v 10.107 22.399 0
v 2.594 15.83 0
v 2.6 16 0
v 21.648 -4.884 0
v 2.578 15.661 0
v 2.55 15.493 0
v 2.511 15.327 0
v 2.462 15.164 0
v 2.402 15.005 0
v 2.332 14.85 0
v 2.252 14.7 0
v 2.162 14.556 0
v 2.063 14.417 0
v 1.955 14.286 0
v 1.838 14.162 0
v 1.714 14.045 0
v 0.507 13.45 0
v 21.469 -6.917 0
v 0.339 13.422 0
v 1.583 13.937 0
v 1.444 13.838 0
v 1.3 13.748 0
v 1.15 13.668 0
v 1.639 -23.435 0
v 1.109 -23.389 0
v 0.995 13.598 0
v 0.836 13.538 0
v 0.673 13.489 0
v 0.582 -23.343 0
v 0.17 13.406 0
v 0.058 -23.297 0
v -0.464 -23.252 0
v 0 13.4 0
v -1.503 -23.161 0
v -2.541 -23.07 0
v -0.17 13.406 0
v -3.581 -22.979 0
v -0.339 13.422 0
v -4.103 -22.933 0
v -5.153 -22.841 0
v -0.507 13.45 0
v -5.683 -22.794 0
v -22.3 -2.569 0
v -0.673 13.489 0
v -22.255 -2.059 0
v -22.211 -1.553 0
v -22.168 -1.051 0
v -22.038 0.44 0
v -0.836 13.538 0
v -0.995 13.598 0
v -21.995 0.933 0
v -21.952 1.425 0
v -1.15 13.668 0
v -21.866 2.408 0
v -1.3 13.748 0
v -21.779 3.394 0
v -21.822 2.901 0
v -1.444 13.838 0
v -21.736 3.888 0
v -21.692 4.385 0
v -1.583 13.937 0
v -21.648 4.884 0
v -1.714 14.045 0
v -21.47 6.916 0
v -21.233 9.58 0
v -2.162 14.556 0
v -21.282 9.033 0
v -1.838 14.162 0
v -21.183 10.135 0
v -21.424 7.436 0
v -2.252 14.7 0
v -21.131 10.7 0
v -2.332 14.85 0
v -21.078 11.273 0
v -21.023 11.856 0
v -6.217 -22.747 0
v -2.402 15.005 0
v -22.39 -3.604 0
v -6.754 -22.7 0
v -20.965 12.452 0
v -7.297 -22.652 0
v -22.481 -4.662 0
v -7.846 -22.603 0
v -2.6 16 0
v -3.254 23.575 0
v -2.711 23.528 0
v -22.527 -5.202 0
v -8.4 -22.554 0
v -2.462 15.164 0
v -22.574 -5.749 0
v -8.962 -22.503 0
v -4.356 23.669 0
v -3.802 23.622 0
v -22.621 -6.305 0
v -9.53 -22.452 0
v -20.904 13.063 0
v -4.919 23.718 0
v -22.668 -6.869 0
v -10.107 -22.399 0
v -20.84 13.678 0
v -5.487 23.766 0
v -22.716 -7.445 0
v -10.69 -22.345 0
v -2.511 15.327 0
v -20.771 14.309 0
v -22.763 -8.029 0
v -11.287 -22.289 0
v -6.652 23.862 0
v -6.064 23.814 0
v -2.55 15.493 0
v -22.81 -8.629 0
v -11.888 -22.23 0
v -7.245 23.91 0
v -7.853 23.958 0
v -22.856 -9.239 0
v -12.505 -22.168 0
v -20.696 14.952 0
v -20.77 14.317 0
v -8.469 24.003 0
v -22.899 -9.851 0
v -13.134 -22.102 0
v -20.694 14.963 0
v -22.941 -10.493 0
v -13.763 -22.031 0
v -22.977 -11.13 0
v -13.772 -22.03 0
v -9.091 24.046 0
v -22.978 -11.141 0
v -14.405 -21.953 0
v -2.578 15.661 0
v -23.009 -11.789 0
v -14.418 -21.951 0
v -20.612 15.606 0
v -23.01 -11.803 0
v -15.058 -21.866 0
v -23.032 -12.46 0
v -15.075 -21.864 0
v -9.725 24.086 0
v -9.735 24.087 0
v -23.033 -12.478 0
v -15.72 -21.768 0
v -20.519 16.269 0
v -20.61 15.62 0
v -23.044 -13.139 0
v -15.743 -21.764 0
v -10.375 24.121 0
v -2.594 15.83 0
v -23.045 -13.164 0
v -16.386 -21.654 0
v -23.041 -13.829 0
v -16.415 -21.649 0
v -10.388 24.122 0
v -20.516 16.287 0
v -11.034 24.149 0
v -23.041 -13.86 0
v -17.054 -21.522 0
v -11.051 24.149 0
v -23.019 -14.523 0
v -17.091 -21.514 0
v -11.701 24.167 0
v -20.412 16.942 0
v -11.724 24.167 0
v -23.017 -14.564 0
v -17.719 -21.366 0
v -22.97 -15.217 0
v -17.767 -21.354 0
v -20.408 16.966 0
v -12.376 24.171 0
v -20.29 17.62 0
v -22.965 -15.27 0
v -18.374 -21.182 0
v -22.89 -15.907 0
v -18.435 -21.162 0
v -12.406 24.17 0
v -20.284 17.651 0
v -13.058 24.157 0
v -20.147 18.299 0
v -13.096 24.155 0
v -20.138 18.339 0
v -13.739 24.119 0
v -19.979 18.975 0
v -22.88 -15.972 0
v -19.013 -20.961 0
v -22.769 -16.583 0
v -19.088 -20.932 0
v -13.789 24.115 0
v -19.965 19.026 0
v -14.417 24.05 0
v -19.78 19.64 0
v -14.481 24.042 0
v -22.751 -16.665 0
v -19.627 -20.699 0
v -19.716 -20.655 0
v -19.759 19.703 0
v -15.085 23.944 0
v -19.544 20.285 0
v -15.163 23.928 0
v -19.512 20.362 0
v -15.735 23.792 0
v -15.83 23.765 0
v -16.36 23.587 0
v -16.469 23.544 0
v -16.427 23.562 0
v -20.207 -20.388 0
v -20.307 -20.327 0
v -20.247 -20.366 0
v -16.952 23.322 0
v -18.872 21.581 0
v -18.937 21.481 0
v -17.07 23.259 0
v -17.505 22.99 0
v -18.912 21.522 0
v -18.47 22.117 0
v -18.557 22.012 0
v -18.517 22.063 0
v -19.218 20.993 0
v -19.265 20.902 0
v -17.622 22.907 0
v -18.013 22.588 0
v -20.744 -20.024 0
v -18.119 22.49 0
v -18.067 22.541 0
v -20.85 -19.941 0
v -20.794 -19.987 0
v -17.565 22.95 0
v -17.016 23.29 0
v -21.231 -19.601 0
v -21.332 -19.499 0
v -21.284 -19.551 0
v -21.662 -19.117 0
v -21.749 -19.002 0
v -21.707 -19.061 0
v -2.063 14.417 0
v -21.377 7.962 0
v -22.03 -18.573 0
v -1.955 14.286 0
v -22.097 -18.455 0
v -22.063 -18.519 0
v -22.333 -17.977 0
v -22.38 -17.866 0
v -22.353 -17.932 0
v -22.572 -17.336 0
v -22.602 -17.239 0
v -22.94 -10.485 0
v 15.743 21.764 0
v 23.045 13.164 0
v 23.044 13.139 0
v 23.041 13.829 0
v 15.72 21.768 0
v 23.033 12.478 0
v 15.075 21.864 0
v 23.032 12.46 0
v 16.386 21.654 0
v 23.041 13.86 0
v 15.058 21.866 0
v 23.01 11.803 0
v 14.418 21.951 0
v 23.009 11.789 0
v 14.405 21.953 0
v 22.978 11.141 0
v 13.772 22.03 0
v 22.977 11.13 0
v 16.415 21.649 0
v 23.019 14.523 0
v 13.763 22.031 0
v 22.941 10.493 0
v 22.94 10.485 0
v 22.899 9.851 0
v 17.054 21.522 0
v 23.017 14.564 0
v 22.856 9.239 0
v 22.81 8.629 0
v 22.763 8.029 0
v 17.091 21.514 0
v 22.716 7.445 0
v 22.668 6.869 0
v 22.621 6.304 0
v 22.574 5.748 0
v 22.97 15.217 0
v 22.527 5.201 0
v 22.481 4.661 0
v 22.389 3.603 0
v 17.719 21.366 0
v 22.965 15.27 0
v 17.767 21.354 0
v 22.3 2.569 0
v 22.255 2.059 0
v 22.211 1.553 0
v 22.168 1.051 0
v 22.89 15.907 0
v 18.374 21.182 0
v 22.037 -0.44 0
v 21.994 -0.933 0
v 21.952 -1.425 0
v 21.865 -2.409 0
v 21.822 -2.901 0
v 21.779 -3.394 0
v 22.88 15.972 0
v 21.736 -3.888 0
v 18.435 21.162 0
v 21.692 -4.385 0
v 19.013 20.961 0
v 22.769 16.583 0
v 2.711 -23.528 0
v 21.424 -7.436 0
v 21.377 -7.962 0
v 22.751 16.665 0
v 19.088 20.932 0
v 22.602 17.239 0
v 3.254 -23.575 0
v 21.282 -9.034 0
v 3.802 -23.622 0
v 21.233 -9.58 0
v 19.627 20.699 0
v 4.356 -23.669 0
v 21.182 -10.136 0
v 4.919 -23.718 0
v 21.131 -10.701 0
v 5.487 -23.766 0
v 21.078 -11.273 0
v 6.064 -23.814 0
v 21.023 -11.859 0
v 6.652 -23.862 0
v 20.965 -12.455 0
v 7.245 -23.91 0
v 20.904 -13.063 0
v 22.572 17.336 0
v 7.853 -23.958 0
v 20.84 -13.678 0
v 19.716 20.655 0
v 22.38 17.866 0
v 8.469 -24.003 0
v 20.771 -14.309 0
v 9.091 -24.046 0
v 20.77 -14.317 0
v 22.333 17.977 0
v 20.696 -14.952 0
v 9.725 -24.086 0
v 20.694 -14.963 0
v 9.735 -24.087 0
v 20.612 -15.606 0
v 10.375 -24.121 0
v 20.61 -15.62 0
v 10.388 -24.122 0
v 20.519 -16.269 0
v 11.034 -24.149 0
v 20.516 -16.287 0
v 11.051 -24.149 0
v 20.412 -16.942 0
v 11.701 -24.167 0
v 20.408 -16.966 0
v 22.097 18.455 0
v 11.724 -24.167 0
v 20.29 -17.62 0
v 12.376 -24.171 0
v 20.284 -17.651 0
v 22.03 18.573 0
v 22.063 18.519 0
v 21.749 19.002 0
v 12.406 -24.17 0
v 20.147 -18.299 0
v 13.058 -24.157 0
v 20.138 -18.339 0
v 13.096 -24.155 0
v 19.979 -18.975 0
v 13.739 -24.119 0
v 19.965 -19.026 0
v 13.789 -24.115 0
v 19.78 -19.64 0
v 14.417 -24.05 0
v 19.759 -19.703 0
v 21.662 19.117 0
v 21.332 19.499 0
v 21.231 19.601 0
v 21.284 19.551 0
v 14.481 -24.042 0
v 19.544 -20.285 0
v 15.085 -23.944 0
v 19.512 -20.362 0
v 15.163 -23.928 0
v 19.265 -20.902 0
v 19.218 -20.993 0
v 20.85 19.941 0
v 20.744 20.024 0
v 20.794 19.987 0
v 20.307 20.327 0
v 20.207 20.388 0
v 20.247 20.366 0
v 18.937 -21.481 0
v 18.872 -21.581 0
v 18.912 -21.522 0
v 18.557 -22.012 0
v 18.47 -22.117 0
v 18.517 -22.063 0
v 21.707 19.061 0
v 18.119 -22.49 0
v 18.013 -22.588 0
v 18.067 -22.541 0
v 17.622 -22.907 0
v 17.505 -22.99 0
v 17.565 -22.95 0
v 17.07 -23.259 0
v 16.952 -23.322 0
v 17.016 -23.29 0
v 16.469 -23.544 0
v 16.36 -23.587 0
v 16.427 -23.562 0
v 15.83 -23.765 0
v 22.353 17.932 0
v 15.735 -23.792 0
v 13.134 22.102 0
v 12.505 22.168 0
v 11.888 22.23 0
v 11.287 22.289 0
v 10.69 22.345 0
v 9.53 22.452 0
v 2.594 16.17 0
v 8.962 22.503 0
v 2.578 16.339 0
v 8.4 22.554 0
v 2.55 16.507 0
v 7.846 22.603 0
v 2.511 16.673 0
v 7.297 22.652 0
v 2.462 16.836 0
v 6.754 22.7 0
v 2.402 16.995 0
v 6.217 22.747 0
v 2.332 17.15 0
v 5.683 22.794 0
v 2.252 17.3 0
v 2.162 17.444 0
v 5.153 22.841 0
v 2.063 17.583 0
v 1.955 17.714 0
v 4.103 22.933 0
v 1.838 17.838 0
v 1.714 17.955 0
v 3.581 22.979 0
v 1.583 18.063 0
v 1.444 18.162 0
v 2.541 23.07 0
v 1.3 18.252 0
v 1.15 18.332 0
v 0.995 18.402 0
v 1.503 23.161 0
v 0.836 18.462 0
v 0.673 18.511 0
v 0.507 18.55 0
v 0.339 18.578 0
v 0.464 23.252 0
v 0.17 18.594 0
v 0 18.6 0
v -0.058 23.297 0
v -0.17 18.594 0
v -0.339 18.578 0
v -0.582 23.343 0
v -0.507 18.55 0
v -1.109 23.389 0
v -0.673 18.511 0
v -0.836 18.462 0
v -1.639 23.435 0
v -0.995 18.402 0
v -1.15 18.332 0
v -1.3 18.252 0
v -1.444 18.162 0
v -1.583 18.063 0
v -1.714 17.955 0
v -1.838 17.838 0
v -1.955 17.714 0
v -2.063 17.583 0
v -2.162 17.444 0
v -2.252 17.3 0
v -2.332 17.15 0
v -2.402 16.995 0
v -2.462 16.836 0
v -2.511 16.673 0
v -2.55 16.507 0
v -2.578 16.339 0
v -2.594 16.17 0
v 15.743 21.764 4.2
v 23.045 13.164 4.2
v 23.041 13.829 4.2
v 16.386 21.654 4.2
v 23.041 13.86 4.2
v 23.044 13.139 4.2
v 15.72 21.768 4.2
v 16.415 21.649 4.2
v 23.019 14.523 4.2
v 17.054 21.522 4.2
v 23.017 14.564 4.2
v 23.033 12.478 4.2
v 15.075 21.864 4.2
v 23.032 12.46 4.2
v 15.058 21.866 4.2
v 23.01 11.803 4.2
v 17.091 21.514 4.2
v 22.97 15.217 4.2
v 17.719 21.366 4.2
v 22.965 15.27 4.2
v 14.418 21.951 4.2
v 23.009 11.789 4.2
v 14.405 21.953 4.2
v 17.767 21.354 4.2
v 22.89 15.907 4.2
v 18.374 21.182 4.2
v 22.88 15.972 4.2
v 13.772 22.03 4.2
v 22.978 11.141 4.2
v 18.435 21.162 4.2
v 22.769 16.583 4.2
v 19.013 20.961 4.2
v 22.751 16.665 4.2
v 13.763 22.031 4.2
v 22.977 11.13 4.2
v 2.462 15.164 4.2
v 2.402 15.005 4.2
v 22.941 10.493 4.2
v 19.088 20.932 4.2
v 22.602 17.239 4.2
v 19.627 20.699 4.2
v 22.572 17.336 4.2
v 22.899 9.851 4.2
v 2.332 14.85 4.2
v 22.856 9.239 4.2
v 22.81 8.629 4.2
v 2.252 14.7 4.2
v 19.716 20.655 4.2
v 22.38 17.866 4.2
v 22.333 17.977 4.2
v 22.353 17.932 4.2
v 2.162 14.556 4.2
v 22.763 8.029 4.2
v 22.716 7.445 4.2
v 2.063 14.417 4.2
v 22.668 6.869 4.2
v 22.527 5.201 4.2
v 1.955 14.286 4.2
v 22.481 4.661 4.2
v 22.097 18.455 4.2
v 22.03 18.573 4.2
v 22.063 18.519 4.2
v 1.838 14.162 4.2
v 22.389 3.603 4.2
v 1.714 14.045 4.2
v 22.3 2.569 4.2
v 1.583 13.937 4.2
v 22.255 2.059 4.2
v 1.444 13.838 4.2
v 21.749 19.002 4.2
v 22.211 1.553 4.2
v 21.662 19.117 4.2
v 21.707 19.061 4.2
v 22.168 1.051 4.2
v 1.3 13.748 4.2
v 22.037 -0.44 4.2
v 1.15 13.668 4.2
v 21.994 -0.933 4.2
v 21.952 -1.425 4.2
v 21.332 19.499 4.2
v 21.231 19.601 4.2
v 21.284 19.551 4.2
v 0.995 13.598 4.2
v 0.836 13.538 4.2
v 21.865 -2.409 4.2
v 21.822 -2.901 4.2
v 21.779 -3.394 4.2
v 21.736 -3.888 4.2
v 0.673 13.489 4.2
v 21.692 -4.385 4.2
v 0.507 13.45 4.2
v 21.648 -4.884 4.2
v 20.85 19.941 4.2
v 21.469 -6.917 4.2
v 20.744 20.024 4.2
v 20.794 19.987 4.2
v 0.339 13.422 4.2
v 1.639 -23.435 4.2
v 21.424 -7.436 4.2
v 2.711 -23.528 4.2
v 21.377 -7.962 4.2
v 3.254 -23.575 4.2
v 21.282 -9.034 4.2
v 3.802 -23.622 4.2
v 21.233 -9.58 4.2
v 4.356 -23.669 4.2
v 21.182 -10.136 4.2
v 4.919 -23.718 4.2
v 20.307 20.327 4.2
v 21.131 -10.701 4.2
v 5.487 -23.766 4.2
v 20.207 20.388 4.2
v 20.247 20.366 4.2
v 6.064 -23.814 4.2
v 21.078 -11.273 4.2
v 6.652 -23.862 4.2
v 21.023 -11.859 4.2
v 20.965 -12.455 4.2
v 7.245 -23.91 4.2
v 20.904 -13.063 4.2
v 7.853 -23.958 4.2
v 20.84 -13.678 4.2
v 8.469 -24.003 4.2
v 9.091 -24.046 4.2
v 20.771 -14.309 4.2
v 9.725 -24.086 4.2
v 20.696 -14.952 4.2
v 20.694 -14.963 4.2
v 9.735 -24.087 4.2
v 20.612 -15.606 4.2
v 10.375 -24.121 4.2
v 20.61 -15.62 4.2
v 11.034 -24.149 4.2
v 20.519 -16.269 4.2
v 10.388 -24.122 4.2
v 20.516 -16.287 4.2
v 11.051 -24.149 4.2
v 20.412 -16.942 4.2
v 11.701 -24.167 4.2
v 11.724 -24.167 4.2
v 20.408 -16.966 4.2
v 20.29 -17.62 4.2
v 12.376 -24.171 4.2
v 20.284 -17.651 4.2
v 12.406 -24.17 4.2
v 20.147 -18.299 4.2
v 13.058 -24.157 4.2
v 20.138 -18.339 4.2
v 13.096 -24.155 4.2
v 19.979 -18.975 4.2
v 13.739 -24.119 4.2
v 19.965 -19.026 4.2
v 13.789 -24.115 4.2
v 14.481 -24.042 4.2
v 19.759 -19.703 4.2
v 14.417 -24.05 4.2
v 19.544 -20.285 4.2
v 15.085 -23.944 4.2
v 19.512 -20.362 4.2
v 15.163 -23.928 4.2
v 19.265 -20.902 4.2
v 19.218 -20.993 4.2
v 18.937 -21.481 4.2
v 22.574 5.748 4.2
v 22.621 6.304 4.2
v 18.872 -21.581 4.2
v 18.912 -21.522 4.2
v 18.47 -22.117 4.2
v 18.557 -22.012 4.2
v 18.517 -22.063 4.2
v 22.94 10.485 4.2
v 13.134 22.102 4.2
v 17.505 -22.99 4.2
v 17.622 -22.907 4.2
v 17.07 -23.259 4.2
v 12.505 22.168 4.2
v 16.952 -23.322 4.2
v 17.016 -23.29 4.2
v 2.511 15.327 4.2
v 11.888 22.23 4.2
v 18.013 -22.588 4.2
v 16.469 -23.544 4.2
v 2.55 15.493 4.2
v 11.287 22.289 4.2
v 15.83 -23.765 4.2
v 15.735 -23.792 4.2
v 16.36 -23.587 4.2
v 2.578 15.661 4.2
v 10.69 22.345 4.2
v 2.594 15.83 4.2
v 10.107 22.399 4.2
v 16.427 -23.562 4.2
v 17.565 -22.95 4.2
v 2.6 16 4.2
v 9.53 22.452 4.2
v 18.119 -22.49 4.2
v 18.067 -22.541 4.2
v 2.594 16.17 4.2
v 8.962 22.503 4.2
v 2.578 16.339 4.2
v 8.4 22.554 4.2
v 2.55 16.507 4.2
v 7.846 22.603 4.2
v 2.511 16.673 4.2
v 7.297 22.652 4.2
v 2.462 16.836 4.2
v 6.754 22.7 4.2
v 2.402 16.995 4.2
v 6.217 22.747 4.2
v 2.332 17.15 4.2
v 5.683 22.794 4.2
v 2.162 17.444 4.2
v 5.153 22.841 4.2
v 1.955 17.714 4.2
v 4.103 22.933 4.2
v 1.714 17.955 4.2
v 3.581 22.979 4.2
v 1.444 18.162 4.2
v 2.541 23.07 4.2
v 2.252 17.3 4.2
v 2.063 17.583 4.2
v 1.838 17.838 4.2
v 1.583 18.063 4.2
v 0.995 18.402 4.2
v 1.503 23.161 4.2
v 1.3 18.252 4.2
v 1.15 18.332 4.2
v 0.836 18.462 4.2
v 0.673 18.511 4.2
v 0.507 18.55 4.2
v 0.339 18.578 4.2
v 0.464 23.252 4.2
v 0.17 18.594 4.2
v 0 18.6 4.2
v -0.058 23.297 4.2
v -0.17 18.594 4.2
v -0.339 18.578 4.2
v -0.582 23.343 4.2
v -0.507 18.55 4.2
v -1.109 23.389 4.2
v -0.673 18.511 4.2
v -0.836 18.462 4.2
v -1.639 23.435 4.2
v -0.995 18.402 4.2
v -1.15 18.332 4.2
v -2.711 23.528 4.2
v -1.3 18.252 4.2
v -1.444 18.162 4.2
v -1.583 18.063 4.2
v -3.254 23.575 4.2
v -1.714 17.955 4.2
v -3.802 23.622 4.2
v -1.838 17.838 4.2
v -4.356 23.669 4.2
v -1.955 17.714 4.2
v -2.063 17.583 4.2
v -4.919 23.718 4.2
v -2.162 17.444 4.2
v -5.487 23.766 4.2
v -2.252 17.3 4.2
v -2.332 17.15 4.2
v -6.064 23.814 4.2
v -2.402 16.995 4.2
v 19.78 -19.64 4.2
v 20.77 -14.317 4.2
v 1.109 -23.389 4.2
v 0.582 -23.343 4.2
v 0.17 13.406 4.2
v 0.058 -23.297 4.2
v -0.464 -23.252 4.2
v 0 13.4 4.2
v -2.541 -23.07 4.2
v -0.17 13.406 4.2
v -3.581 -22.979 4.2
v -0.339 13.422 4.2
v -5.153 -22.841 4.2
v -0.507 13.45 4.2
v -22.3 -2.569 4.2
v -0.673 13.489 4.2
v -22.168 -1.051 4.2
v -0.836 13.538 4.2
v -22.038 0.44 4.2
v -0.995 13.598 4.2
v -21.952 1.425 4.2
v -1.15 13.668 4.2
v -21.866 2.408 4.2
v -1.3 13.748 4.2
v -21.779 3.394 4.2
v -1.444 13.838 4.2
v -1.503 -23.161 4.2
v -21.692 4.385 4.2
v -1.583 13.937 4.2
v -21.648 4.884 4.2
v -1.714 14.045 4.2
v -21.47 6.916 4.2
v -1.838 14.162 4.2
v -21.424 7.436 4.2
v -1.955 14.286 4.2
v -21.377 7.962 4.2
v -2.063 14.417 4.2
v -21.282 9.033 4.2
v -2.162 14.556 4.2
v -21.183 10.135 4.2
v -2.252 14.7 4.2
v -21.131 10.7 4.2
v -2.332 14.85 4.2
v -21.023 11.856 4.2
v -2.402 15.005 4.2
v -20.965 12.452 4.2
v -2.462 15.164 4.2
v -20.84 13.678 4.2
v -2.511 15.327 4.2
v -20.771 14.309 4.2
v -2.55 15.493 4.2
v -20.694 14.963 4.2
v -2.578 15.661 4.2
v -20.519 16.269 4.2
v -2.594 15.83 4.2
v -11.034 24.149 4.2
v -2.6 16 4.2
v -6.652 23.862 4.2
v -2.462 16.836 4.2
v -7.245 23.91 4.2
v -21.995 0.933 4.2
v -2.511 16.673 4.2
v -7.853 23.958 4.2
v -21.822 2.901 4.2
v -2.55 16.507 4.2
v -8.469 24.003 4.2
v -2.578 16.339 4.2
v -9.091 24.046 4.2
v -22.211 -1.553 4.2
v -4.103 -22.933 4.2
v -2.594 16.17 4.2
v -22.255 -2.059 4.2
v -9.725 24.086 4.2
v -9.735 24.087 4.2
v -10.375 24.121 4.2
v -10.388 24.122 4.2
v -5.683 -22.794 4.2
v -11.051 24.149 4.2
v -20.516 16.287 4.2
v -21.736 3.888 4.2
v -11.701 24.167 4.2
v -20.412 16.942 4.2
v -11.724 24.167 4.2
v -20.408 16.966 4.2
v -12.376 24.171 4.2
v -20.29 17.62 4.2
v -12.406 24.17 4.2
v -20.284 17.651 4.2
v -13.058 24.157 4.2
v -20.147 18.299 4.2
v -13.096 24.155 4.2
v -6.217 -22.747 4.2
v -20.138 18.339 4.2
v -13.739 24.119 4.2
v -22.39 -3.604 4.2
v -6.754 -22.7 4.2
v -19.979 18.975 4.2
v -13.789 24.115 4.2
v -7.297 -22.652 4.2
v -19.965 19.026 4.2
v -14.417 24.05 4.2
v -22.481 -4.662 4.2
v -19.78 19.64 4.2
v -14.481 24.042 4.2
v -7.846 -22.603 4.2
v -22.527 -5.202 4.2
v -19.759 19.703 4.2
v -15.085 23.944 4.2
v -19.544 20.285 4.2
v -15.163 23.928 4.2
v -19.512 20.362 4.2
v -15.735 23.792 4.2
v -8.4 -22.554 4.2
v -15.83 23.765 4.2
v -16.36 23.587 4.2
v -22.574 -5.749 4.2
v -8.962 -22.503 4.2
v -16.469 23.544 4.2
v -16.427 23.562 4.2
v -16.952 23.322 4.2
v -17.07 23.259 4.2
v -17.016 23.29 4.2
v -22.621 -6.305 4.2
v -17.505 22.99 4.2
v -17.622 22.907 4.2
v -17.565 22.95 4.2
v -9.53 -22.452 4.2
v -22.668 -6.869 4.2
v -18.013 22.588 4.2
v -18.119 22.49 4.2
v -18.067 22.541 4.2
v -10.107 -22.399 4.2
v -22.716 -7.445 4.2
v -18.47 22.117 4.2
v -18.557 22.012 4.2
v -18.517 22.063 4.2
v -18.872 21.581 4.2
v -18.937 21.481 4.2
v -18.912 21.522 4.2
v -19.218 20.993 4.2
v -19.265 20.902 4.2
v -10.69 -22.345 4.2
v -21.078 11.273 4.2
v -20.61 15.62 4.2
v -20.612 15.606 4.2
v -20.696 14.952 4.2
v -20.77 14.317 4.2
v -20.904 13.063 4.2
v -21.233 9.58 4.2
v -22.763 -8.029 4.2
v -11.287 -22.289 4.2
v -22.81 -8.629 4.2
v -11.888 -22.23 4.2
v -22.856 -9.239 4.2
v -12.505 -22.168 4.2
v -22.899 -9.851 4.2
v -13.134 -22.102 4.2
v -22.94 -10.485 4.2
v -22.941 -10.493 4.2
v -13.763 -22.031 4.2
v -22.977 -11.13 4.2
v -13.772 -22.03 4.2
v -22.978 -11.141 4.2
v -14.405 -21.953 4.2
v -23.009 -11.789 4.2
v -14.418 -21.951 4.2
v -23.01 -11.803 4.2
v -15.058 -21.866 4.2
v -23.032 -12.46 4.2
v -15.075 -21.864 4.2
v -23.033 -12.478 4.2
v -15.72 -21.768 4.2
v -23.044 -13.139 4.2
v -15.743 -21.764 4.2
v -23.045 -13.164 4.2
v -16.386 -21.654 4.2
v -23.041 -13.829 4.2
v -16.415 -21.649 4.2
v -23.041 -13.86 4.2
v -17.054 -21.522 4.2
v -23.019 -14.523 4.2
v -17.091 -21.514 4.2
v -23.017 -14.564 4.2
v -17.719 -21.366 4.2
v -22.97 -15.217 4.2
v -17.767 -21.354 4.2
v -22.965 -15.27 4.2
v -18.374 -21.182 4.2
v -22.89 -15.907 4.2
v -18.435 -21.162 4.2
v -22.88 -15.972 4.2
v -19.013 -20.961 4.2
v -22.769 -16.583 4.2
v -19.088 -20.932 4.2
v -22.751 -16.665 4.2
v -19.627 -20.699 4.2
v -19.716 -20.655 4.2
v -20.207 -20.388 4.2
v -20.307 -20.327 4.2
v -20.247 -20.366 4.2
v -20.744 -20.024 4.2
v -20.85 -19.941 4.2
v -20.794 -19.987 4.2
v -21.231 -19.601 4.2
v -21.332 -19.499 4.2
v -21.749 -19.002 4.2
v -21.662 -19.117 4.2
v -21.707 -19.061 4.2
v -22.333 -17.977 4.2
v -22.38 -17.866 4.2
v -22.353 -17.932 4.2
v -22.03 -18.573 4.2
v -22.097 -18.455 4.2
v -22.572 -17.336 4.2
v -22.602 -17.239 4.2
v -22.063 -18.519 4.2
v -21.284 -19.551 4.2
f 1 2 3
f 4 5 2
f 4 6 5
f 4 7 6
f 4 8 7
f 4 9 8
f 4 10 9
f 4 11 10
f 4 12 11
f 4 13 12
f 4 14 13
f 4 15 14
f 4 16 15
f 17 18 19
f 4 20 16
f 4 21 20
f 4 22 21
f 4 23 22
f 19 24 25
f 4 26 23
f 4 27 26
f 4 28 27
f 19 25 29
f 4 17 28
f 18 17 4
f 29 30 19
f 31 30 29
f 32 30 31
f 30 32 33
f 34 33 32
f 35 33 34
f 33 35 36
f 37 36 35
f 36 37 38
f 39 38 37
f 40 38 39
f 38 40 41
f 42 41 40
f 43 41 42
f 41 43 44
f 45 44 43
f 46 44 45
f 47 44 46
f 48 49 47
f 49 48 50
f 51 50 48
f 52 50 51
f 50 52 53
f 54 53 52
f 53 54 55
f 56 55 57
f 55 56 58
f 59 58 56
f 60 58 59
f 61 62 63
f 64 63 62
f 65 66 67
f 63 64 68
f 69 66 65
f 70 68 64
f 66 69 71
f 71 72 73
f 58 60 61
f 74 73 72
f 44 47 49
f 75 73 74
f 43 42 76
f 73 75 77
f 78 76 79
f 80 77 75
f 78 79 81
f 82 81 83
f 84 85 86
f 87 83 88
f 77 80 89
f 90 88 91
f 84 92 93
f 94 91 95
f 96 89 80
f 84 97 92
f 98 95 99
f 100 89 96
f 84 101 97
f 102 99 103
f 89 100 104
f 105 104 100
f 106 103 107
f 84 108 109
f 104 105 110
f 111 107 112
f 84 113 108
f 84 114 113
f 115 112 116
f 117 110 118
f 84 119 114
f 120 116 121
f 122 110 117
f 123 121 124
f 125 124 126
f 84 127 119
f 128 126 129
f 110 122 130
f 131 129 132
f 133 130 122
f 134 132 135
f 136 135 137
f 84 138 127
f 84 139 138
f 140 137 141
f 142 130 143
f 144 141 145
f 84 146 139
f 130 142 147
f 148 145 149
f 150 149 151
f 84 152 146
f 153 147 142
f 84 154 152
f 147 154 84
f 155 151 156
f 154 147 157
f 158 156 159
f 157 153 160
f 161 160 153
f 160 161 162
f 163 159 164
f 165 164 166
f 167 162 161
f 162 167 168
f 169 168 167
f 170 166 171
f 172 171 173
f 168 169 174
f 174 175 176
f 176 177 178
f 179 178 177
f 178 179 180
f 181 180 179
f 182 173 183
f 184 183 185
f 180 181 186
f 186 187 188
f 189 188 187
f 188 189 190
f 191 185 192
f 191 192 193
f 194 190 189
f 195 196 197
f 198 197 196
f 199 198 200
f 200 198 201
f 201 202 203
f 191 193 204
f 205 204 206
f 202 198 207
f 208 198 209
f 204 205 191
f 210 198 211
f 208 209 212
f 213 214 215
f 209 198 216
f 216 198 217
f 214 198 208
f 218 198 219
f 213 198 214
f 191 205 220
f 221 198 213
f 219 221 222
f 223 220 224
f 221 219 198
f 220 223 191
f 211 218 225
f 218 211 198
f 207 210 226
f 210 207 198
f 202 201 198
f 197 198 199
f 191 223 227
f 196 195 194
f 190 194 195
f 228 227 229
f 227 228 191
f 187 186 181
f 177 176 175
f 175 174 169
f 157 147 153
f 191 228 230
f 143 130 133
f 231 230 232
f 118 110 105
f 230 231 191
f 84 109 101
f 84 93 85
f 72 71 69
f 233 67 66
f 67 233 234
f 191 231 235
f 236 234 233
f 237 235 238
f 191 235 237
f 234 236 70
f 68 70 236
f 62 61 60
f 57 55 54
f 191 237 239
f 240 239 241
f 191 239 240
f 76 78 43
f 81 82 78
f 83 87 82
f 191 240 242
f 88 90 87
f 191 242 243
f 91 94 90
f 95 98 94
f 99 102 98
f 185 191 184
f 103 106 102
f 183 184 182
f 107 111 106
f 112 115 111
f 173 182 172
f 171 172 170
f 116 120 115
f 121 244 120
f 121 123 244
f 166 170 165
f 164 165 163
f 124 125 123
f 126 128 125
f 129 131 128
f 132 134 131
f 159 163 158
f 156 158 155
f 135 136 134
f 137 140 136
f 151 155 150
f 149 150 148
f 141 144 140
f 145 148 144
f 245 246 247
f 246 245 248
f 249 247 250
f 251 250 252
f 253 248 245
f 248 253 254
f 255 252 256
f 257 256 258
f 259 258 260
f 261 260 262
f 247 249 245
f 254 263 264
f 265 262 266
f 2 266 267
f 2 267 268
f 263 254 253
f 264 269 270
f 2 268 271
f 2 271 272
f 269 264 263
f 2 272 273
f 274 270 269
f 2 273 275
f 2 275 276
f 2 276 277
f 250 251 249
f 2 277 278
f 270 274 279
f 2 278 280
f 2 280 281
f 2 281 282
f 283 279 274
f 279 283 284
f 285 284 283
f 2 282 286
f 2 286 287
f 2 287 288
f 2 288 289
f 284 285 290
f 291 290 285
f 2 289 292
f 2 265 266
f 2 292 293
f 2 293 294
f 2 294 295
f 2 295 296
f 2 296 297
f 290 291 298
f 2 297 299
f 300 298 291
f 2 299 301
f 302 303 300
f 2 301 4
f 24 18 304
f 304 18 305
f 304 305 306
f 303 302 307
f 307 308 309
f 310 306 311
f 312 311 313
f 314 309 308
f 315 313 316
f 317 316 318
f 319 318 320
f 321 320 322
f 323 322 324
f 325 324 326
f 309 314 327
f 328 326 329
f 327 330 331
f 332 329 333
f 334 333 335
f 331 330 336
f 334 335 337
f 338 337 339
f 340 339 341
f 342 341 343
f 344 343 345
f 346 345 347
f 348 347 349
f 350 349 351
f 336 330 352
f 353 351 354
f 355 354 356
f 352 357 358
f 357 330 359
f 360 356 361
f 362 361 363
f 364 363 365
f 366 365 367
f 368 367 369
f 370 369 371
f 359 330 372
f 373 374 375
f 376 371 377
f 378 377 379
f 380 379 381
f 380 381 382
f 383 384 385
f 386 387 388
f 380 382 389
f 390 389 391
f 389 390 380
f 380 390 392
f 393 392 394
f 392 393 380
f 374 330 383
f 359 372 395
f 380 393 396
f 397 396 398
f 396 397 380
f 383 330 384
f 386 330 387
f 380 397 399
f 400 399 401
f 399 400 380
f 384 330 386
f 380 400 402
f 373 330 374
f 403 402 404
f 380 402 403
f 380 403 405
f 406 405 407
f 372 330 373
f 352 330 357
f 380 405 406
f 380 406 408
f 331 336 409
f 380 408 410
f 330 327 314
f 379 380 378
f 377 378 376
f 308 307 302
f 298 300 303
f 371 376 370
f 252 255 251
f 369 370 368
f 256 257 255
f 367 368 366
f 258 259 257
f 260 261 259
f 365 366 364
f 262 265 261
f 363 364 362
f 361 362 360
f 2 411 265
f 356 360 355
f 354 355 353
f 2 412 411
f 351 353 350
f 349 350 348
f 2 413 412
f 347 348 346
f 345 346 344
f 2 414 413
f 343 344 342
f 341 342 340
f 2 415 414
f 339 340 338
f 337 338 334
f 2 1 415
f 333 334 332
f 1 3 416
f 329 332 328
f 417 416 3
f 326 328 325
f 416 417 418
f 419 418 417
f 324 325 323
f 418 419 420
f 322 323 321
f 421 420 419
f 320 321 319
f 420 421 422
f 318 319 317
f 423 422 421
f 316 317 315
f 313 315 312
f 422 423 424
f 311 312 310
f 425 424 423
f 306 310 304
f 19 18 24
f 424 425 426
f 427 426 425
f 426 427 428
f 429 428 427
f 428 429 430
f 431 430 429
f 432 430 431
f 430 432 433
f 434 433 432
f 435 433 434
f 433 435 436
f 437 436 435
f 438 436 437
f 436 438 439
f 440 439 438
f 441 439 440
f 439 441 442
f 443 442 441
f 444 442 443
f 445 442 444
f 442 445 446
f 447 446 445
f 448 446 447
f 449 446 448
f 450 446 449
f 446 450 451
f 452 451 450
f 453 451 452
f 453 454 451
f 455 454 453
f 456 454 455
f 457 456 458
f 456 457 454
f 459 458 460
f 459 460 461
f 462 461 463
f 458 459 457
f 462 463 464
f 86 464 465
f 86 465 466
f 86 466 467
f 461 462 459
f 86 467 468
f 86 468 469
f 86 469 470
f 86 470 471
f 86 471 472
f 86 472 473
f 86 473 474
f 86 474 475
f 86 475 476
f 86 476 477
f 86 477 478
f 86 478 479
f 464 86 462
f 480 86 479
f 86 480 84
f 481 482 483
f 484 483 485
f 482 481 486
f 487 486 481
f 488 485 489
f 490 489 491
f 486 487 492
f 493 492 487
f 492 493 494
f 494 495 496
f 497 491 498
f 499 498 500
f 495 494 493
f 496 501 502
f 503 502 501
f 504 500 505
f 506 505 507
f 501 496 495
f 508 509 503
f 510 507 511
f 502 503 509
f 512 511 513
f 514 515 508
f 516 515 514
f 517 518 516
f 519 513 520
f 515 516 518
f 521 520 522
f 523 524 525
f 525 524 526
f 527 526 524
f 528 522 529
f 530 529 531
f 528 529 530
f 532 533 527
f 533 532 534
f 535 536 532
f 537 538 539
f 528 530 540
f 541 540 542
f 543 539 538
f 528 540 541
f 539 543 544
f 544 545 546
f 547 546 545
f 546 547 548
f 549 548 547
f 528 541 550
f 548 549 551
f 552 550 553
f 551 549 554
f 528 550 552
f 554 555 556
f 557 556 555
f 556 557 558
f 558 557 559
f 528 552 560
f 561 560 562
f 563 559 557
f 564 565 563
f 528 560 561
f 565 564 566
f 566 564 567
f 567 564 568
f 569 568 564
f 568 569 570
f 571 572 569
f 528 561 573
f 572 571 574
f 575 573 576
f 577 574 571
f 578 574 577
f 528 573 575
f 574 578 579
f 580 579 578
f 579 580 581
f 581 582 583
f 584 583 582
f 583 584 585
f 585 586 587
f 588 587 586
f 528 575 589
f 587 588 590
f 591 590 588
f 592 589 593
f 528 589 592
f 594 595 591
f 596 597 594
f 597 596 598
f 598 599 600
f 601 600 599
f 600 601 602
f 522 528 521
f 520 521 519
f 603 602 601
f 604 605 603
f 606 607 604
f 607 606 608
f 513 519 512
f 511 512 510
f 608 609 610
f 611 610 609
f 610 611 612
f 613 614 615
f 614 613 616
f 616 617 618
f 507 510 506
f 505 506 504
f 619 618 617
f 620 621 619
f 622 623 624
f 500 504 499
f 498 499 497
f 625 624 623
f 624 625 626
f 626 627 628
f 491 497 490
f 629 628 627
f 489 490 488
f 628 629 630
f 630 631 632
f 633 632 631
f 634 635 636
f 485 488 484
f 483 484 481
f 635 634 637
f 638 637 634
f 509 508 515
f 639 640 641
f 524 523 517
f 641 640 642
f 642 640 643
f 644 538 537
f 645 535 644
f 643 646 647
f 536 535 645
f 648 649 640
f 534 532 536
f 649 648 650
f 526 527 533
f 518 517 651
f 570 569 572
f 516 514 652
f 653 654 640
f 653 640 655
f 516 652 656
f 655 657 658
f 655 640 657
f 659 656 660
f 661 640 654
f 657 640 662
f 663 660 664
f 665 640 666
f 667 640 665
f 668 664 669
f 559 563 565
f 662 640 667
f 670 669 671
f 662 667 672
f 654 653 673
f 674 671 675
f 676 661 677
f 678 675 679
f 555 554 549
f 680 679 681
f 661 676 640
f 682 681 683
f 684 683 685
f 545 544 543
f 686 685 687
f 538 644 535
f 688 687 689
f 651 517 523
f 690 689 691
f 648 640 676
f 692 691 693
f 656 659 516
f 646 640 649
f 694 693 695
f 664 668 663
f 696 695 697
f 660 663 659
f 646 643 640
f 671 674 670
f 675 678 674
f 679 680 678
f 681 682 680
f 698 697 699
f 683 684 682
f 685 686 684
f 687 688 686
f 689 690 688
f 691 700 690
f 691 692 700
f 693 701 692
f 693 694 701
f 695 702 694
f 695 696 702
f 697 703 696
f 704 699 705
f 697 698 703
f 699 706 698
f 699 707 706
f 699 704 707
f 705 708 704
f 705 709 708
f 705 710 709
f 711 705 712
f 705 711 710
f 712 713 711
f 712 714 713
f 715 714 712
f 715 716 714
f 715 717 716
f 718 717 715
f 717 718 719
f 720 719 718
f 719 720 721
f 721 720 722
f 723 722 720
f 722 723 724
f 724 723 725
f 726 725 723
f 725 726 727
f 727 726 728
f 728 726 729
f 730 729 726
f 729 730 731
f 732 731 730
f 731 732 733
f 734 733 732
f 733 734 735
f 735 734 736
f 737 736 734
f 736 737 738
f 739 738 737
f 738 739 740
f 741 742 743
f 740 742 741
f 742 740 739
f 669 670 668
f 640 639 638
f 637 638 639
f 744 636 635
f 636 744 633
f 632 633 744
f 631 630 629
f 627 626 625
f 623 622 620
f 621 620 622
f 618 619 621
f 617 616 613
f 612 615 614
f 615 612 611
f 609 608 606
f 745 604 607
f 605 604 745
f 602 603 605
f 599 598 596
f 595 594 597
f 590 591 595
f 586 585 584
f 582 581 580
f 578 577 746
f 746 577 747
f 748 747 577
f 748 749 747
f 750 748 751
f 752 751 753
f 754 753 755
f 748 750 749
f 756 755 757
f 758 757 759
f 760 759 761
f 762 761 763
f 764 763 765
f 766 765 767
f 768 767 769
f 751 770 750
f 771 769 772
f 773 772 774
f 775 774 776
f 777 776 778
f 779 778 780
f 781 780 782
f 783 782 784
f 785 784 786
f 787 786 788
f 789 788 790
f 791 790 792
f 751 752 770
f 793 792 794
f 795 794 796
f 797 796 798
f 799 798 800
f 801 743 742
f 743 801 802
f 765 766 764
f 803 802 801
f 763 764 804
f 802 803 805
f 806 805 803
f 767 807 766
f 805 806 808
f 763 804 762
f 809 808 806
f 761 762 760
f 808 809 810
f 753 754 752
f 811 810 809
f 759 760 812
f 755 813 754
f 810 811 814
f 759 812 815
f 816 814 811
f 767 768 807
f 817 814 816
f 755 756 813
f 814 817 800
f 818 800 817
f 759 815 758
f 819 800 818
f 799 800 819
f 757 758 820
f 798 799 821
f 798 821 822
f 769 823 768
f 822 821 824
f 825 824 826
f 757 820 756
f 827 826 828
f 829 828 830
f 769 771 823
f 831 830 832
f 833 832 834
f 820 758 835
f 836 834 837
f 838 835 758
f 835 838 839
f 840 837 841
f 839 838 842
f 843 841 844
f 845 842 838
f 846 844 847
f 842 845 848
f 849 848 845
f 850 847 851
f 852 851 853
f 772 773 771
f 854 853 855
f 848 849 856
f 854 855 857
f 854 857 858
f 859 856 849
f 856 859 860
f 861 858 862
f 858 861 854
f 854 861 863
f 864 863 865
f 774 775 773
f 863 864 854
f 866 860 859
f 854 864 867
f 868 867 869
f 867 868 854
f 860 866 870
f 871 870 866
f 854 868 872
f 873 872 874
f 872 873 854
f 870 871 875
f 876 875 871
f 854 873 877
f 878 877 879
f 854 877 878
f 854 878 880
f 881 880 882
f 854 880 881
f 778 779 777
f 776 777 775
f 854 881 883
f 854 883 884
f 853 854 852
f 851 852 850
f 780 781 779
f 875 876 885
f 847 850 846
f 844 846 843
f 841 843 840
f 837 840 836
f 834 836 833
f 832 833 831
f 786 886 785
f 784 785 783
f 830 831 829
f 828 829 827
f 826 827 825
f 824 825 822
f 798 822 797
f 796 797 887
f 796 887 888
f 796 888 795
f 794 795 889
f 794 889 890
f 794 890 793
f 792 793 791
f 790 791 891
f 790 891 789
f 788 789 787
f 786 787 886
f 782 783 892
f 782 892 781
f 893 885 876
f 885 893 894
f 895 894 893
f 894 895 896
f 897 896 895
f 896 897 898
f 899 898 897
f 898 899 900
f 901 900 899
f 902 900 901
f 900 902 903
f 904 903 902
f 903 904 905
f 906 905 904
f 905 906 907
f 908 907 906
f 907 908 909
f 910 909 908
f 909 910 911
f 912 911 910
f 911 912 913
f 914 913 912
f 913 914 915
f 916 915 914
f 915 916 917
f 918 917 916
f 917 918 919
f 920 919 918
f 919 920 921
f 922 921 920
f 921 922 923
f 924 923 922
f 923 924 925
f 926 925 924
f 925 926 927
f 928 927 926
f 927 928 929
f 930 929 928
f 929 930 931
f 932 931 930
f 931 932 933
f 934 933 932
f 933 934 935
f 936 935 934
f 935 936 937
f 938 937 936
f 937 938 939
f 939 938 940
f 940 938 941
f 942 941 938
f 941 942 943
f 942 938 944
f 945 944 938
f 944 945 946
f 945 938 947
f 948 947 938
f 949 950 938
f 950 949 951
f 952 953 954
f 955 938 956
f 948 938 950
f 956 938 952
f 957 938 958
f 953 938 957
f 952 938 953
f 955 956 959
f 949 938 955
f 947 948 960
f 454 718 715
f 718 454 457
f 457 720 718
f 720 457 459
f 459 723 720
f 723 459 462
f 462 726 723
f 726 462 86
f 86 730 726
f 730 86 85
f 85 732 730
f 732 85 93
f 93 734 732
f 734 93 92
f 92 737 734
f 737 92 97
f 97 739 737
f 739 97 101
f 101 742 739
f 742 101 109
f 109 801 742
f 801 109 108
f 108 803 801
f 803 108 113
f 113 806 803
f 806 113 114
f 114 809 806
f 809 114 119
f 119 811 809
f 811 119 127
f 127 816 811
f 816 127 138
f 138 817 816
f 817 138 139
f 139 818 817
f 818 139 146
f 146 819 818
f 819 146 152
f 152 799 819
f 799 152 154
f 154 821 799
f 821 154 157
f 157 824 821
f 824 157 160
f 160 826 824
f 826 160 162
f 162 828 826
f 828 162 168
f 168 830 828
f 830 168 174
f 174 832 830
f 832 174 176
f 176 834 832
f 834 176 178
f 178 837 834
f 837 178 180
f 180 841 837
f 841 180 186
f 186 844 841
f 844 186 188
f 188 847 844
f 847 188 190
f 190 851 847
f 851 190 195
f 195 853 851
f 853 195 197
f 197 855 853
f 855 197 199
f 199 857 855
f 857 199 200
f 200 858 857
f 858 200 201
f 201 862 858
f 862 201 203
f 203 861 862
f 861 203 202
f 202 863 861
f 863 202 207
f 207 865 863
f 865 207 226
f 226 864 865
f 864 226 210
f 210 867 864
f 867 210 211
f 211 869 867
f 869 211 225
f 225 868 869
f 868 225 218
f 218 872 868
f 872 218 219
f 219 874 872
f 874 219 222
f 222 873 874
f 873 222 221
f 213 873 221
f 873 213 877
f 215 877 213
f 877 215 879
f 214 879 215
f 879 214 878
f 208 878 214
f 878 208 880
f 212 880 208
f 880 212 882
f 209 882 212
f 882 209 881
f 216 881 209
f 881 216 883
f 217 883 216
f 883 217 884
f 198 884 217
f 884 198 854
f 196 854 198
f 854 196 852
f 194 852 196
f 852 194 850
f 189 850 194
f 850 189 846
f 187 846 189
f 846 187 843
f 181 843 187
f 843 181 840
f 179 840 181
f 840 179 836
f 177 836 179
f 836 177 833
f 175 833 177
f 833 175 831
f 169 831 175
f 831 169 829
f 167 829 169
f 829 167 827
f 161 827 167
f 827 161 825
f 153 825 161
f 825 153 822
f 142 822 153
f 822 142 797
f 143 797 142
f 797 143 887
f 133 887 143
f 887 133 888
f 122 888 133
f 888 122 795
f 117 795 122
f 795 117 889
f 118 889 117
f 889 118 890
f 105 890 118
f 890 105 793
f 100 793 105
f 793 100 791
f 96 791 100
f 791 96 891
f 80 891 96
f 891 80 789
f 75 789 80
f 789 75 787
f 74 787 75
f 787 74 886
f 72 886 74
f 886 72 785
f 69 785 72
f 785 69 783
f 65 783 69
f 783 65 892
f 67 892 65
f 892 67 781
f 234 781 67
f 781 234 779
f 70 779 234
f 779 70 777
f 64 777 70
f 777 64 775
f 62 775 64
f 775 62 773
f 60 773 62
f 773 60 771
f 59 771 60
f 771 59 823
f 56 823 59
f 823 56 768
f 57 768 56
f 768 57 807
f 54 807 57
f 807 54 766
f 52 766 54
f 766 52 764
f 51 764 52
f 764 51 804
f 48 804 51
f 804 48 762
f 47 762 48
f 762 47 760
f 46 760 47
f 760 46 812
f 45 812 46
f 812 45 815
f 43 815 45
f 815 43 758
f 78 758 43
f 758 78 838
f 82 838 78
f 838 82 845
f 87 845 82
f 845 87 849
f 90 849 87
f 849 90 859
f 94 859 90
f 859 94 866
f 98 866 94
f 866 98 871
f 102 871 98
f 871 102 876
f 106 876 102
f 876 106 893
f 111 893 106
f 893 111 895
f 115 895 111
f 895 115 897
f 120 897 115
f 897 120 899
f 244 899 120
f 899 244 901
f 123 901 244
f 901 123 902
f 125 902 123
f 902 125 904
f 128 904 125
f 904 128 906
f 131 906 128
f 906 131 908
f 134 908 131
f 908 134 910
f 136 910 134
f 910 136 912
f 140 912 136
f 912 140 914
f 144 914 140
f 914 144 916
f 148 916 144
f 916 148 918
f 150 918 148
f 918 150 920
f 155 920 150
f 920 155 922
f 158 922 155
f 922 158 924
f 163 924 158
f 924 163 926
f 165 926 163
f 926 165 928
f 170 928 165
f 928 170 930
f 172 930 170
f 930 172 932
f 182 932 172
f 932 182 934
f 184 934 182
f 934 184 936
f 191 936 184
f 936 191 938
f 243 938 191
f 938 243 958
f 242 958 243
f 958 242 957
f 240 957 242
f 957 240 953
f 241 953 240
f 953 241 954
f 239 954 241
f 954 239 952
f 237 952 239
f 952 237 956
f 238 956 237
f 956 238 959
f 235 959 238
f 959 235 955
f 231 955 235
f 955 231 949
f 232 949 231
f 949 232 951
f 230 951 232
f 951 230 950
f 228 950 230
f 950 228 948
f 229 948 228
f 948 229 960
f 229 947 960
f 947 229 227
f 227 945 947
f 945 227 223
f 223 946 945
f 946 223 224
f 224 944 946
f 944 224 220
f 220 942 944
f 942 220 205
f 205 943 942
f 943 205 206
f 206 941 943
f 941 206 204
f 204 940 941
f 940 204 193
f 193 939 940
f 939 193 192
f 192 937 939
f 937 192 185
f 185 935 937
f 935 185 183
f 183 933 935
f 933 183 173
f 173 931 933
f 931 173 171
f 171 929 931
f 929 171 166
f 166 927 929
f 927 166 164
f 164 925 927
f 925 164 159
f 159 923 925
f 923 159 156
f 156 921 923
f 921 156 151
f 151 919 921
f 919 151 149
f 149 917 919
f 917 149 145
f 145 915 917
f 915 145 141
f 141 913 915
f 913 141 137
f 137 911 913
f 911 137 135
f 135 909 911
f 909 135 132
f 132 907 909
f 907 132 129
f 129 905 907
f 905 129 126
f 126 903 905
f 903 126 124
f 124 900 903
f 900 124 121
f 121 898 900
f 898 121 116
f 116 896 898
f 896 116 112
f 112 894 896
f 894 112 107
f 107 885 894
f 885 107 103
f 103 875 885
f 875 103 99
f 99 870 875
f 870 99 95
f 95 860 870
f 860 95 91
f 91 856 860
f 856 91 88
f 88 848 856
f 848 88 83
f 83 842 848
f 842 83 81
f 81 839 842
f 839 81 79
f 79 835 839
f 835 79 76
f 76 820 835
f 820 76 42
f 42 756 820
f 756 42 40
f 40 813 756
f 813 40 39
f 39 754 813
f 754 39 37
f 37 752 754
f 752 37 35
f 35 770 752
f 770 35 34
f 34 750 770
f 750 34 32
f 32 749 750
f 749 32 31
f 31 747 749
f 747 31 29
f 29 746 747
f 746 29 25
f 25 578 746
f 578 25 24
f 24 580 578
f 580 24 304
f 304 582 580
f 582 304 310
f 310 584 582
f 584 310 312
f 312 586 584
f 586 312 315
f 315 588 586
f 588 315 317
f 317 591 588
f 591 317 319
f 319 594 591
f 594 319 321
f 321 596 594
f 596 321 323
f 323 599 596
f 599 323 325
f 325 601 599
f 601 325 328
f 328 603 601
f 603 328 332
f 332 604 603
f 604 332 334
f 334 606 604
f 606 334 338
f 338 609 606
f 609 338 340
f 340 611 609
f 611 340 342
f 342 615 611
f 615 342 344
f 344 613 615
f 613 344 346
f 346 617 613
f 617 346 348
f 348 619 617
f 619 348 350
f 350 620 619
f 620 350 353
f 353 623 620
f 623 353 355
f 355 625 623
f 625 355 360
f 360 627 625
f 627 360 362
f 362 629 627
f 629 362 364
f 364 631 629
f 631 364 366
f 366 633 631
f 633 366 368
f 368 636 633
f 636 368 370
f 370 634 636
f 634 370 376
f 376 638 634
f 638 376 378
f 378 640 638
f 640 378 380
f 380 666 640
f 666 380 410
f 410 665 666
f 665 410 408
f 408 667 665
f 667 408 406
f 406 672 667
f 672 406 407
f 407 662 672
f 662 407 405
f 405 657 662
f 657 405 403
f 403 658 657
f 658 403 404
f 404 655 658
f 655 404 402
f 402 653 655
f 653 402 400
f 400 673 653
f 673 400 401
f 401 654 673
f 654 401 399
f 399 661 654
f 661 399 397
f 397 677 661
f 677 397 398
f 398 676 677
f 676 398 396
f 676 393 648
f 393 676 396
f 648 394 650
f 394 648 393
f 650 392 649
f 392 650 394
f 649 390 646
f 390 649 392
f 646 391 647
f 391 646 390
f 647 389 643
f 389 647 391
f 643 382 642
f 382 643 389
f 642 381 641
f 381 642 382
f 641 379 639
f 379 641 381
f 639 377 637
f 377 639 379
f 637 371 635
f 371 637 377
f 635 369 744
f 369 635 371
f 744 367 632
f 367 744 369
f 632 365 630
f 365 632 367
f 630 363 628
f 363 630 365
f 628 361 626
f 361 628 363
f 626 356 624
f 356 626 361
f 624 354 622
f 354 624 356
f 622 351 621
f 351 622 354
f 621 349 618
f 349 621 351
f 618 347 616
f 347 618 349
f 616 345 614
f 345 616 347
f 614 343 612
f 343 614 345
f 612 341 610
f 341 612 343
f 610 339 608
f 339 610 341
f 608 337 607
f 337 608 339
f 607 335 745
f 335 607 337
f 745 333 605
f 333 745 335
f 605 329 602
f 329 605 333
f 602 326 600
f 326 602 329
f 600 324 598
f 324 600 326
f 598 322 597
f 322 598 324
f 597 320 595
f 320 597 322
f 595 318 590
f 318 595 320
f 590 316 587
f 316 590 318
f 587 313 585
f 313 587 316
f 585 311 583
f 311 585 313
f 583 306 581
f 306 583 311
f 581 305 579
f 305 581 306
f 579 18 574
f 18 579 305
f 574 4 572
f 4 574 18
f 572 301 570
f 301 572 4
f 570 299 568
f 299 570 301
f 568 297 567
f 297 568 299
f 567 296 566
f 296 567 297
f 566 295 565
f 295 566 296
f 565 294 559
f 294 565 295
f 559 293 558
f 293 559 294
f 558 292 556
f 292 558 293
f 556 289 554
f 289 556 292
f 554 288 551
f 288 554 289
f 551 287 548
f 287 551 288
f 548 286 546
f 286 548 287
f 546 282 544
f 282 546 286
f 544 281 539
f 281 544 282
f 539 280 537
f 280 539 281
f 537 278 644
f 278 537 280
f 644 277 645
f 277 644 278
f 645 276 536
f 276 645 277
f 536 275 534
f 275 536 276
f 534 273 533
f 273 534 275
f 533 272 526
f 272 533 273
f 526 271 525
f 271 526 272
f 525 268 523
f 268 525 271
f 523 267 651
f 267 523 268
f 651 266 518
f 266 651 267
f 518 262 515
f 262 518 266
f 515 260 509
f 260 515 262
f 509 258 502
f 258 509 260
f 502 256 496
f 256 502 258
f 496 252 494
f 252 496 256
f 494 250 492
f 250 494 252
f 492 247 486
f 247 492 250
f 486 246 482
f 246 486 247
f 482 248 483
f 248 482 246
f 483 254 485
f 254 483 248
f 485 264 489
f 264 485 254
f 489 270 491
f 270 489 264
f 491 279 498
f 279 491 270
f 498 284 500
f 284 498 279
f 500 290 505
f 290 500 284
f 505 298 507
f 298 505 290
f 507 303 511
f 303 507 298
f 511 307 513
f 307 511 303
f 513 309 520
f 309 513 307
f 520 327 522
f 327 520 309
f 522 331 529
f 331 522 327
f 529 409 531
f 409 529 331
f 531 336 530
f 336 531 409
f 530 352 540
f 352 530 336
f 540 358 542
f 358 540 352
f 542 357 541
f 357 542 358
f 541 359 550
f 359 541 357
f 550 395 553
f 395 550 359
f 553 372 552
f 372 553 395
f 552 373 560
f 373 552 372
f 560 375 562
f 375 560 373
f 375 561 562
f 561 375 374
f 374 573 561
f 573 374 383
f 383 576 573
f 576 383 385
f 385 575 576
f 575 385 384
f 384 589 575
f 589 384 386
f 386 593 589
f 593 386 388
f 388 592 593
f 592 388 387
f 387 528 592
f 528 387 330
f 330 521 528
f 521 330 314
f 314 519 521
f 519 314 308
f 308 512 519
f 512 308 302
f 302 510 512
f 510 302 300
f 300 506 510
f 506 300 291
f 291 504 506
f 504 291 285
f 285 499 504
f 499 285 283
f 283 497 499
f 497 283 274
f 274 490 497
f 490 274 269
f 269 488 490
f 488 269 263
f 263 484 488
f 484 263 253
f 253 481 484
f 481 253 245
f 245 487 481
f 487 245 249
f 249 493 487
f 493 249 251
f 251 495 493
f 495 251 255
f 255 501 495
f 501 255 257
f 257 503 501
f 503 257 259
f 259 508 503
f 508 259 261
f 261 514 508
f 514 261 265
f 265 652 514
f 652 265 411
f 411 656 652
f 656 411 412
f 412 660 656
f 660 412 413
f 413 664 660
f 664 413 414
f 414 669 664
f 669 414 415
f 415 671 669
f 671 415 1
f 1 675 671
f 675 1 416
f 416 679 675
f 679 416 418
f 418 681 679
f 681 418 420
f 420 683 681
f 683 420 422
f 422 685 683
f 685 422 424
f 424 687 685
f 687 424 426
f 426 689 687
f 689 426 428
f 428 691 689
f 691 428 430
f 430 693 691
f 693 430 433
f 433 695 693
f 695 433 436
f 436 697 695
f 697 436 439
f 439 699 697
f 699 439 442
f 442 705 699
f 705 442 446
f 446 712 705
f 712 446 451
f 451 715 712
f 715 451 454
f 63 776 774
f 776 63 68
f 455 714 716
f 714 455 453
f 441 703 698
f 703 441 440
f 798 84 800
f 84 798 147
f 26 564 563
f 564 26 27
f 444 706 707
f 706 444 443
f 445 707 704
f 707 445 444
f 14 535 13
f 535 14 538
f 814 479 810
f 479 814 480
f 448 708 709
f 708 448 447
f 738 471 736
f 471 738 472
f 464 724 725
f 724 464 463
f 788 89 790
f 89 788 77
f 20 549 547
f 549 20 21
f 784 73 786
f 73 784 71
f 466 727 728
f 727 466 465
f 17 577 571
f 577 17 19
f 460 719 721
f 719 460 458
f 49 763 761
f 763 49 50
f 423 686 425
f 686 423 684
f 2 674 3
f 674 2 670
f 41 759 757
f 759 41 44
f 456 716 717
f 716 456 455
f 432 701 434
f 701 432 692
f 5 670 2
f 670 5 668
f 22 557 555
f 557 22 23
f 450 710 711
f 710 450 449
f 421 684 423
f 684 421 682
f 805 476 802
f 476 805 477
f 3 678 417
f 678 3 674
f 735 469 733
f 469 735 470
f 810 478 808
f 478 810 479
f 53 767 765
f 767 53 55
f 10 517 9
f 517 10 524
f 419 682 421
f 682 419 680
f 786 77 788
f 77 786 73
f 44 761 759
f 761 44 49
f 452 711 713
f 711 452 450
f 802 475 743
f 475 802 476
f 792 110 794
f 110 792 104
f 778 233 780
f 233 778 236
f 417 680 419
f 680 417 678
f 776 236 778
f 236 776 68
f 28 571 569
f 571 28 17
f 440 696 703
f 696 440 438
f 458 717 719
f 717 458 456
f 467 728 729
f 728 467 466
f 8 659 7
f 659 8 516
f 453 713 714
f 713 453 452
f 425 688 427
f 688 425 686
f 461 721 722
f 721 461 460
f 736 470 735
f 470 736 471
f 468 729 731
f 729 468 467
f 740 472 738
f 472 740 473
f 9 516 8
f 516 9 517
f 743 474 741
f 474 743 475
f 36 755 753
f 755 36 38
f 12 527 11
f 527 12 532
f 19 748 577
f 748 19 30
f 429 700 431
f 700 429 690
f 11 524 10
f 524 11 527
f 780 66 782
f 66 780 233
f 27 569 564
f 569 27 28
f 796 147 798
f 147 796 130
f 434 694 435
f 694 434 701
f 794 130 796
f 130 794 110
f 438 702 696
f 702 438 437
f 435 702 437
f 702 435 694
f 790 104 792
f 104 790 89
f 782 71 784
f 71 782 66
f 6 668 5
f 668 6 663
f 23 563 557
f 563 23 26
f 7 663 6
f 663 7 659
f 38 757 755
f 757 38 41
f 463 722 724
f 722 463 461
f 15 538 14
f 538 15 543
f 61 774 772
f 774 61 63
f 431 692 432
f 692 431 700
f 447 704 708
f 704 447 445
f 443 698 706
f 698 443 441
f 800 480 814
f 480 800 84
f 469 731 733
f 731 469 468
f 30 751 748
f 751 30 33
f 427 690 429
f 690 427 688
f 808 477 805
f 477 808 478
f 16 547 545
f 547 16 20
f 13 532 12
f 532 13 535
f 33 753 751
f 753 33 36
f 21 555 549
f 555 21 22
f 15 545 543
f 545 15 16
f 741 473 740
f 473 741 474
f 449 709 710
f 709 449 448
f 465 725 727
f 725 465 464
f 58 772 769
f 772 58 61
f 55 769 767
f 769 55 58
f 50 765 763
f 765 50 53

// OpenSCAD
$fn=96;
thickness_mm = 4.2;
pts = [[21.9085, -1.9167], [21.9515, -1.425], [21.9945, -0.9328], [22.0375, -0.4397], [22.0807, 0.055], [22.1241, 0.5518], [22.1677, 1.051], [22.2114, 1.5532], [22.2553, 2.059], [22.2997, 2.5689], [22.3444, 3.0835], [22.3895, 3.6033], [22.4348, 4.1291], [22.4807, 4.6614], [22.5271, 5.2008], [22.5738, 5.7479], [22.6208, 6.3037], [22.6681, 6.8686], [22.7155, 7.4434], [22.7628, 8.0287], [22.8095, 8.6254], [22.8552, 9.2341], [22.8992, 9.8552], [22.9405, 10.4891], [22.9778, 11.1361], [23.0093, 11.7961], [23.0325, 12.4684], [23.0446, 13.152], [23.0413, 13.8446], [23.018, 14.5433], [22.9685, 15.2437], [22.8857, 15.9398], [22.7619, 16.6243], [22.5889, 17.2884], [22.3593, 17.9224], [22.0671, 18.5165], [21.709, 19.0623], [21.2852, 19.5532], [20.7994, 19.9858], [20.2588, 20.3601], [19.6728, 20.679], [19.0514, 20.9477], [18.4051, 21.1727], [17.7429, 21.3607], [17.0727, 21.5184], [16.4006, 21.6518], [15.7311, 21.7659], [15.0675, 21.8649], [14.4121, 21.9523], [13.7663, 22.0306], [13.1307, 22.1021], [12.5057, 22.1681], [11.8911, 22.2301], [11.2867, 22.2888], [10.6922, 22.345], [10.1069, 22.3993], [9.5303, 22.4518], [8.9616, 22.5032], [8.4003, 22.5535], [7.8459, 22.6029], [7.2976, 22.6516], [6.7547, 22.6997], [6.2168, 22.7471], [5.6833, 22.7942], [5.1534, 22.8409], [4.6268, 22.8872], [4.1028, 22.9333], [3.5808, 22.9791], [3.0605, 23.0247], [2.5412, 23.0702], [2.0224, 23.1156], [1.5035, 23.161], [0.9842, 23.2063], [0.4639, 23.2517], [-0.0581, 23.2973], [-0.5821, 23.343], [-1.1089, 23.3887], [-1.6388, 23.4348], [-2.1724, 23.4811], [-2.7103, 23.5278], [-3.2533, 23.5747], [-3.8018, 23.6219], [-4.3563, 23.6695], [-4.9178, 23.7175], [-5.4868, 23.7656], [-6.0637, 23.814], [-6.6496, 23.8623], [-7.2449, 23.9101], [-7.8503, 23.9573], [-8.4662, 24.0029], [-9.0932, 24.0464], [-9.7316, 24.0864], [-10.3812, 24.1215], [-11.0418, 24.1491], [-11.7125, 24.1669], [-12.3916, 24.1708], [-13.0767, 24.1561], [-13.7641, 24.1172], [-14.4488, 24.047], [-15.1244, 23.9377], [-15.783, 23.781], [-16.4155, 23.5687], [-17.0129, 23.2939], [-17.5664, 22.9523], [-18.0691, 22.5424], [-18.5165, 22.0671], [-18.9074, 21.5327], [-19.2437, 20.9483], [-19.5293, 20.3243], [-19.7701, 19.6717], [-19.9725, 19.0005], [-20.1429, 18.3194], [-20.2872, 17.6354], [-20.4106, 16.9538], [-20.5175, 16.2786], [-20.6113, 15.6124], [-20.695, 14.957], [-20.7705, 14.3133], [-20.8399, 13.6819], [-20.9045, 13.0626], [-20.9651, 12.4552], [-21.0228, 11.8595], [-21.0778, 11.2749], [-21.131, 10.7005], [-21.1825, 10.1359], [-21.2327, 9.5805], [-21.2818, 9.0336], [-21.3297, 8.4943], [-21.377, 7.9621], [-21.4236, 7.4365], [-21.4695, 6.9167], [-21.5148, 6.4022], [-21.5597, 5.8923], [-21.6042, 5.3865], [-21.6484, 4.8844], [-21.6922, 4.3852], [-21.7357, 3.8885], [-21.7791, 3.3938], [-21.8223, 2.9007], [-21.8655, 2.4085], [-21.9085, 1.9167], [-21.9515, 1.425], [-21.9945, 0.9328], [-22.0375, 0.4397], [-22.0807, -0.055], [-22.1241, -0.5518], [-22.1677, -1.051], [-22.2114, -1.5532], [-22.2553, -2.059], [-22.2997, -2.5689], [-22.3444, -3.0835], [-22.3895, -3.6033], [-22.4348, -4.1291], [-22.4807, -4.6614], [-22.5271, -5.2008], [-22.5738, -5.7479], [-22.6208, -6.3037], [-22.6681, -6.8686], [-22.7155, -7.4434], [-22.7628, -8.0287], [-22.8095, -8.6254], [-22.8552, -9.2341], [-22.8992, -9.8552], [-22.9405, -10.4891], [-22.9778, -11.1361], [-23.0093, -11.7961], [-23.0325, -12.4684], [-23.0446, -13.152], [-23.0413, -13.8446], [-23.018, -14.5433], [-22.9685, -15.2437], [-22.8857, -15.9398], [-22.7619, -16.6243], [-22.5889, -17.2884], [-22.3593, -17.9224], [-22.0671, -18.5165], [-21.709, -19.0623], [-21.2852, -19.5532], [-20.7994, -19.9858], [-20.2588, -20.3601], [-19.6728, -20.679], [-19.0514, -20.9477], [-18.4051, -21.1727], [-17.7429, -21.3607], [-17.0727, -21.5184], [-16.4006, -21.6518], [-15.7311, -21.7659], [-15.0675, -21.8649], [-14.4121, -21.9523], [-13.7663, -22.0306], [-13.1307, -22.1021], [-12.5057, -22.1681], [-11.8911, -22.2301], [-11.2867, -22.2888], [-10.6922, -22.345], [-10.1069, -22.3993], [-9.5303, -22.4518], [-8.9616, -22.5032], [-8.4003, -22.5535], [-7.8459, -22.6029], [-7.2976, -22.6516], [-6.7547, -22.6997], [-6.2168, -22.7471], [-5.6833, -22.7942], [-5.1534, -22.8409], [-4.6268, -22.8872], [-4.1028, -22.9333], [-3.5808, -22.9791], [-3.0605, -23.0247], [-2.5412, -23.0702], [-2.0224, -23.1156], [-1.5035, -23.161], [-0.9842, -23.2063], [-0.4639, -23.2517], [0.0581, -23.2973], [0.5821, -23.343], [1.1089, -23.3887], [1.6388, -23.4348], [2.1724, -23.4811], [2.7103, -23.5278], [3.2533, -23.5747], [3.8018, -23.6219], [4.3563, -23.6695], [4.9178, -23.7175], [5.4868, -23.7656], [6.0637, -23.814], [6.6496, -23.8623], [7.2449, -23.9101], [7.8503, -23.9573], [8.4662, -24.0029], [9.0932, -24.0464], [9.7316, -24.0864], [10.3812, -24.1215], [11.0418, -24.1491], [11.7125, -24.1669], [12.3916, -24.1708], [13.0767, -24.1561], [13.7641, -24.1172], [14.4488, -24.047], [15.1244, -23.9377], [15.783, -23.781], [16.4155, -23.5687], [17.0129, -23.2939], [17.5664, -22.9523], [18.0691, -22.5424], [18.5165, -22.0671], [18.9074, -21.5327], [19.2437, -20.9483], [19.5293, -20.3243], [19.7701, -19.6717], [19.9725, -19.0005], [20.1429, -18.3194], [20.2872, -17.6354], [20.4106, -16.9538], [20.5175, -16.2786], [20.6113, -15.6124], [20.695, -14.957], [20.7705, -14.3133], [20.8399, -13.6819], [20.9045, -13.0626], [20.9651, -12.4552], [21.0228, -11.8595], [21.0778, -11.2749], [21.131, -10.7005], [21.1825, -10.1359], [21.2327, -9.5805], [21.2818, -9.0336], [21.3297, -8.4943], [21.377, -7.9621], [21.4236, -7.4365], [21.4695, -6.9167], [21.5148, -6.4022], [21.5597, -5.8923], [21.6042, -5.3865], [21.6484, -4.8844], [21.6922, -4.3852], [21.7357, -3.8885], [21.7791, -3.3938], [21.8223, -2.9007], [21.8655, -2.4085]];
hole = [0.0, 16.0, 2.6];
offset_r = 1.1;
module shape2d(){
  // CGAL fix + style control
  offset(r=offset_r) offset(r=-offset_r)
    polygon(points=pts, paths=[[for(i=[0:len(pts)-1]) i]]);
}
module body(){
  linear_extrude(height=thickness_mm, convexity=10)
    shape2d();
}
difference(){
  body();
  translate([hole[0], hole[1], -1])
    cylinder(h=thickness_mm+2, r=hole[2]);
}
